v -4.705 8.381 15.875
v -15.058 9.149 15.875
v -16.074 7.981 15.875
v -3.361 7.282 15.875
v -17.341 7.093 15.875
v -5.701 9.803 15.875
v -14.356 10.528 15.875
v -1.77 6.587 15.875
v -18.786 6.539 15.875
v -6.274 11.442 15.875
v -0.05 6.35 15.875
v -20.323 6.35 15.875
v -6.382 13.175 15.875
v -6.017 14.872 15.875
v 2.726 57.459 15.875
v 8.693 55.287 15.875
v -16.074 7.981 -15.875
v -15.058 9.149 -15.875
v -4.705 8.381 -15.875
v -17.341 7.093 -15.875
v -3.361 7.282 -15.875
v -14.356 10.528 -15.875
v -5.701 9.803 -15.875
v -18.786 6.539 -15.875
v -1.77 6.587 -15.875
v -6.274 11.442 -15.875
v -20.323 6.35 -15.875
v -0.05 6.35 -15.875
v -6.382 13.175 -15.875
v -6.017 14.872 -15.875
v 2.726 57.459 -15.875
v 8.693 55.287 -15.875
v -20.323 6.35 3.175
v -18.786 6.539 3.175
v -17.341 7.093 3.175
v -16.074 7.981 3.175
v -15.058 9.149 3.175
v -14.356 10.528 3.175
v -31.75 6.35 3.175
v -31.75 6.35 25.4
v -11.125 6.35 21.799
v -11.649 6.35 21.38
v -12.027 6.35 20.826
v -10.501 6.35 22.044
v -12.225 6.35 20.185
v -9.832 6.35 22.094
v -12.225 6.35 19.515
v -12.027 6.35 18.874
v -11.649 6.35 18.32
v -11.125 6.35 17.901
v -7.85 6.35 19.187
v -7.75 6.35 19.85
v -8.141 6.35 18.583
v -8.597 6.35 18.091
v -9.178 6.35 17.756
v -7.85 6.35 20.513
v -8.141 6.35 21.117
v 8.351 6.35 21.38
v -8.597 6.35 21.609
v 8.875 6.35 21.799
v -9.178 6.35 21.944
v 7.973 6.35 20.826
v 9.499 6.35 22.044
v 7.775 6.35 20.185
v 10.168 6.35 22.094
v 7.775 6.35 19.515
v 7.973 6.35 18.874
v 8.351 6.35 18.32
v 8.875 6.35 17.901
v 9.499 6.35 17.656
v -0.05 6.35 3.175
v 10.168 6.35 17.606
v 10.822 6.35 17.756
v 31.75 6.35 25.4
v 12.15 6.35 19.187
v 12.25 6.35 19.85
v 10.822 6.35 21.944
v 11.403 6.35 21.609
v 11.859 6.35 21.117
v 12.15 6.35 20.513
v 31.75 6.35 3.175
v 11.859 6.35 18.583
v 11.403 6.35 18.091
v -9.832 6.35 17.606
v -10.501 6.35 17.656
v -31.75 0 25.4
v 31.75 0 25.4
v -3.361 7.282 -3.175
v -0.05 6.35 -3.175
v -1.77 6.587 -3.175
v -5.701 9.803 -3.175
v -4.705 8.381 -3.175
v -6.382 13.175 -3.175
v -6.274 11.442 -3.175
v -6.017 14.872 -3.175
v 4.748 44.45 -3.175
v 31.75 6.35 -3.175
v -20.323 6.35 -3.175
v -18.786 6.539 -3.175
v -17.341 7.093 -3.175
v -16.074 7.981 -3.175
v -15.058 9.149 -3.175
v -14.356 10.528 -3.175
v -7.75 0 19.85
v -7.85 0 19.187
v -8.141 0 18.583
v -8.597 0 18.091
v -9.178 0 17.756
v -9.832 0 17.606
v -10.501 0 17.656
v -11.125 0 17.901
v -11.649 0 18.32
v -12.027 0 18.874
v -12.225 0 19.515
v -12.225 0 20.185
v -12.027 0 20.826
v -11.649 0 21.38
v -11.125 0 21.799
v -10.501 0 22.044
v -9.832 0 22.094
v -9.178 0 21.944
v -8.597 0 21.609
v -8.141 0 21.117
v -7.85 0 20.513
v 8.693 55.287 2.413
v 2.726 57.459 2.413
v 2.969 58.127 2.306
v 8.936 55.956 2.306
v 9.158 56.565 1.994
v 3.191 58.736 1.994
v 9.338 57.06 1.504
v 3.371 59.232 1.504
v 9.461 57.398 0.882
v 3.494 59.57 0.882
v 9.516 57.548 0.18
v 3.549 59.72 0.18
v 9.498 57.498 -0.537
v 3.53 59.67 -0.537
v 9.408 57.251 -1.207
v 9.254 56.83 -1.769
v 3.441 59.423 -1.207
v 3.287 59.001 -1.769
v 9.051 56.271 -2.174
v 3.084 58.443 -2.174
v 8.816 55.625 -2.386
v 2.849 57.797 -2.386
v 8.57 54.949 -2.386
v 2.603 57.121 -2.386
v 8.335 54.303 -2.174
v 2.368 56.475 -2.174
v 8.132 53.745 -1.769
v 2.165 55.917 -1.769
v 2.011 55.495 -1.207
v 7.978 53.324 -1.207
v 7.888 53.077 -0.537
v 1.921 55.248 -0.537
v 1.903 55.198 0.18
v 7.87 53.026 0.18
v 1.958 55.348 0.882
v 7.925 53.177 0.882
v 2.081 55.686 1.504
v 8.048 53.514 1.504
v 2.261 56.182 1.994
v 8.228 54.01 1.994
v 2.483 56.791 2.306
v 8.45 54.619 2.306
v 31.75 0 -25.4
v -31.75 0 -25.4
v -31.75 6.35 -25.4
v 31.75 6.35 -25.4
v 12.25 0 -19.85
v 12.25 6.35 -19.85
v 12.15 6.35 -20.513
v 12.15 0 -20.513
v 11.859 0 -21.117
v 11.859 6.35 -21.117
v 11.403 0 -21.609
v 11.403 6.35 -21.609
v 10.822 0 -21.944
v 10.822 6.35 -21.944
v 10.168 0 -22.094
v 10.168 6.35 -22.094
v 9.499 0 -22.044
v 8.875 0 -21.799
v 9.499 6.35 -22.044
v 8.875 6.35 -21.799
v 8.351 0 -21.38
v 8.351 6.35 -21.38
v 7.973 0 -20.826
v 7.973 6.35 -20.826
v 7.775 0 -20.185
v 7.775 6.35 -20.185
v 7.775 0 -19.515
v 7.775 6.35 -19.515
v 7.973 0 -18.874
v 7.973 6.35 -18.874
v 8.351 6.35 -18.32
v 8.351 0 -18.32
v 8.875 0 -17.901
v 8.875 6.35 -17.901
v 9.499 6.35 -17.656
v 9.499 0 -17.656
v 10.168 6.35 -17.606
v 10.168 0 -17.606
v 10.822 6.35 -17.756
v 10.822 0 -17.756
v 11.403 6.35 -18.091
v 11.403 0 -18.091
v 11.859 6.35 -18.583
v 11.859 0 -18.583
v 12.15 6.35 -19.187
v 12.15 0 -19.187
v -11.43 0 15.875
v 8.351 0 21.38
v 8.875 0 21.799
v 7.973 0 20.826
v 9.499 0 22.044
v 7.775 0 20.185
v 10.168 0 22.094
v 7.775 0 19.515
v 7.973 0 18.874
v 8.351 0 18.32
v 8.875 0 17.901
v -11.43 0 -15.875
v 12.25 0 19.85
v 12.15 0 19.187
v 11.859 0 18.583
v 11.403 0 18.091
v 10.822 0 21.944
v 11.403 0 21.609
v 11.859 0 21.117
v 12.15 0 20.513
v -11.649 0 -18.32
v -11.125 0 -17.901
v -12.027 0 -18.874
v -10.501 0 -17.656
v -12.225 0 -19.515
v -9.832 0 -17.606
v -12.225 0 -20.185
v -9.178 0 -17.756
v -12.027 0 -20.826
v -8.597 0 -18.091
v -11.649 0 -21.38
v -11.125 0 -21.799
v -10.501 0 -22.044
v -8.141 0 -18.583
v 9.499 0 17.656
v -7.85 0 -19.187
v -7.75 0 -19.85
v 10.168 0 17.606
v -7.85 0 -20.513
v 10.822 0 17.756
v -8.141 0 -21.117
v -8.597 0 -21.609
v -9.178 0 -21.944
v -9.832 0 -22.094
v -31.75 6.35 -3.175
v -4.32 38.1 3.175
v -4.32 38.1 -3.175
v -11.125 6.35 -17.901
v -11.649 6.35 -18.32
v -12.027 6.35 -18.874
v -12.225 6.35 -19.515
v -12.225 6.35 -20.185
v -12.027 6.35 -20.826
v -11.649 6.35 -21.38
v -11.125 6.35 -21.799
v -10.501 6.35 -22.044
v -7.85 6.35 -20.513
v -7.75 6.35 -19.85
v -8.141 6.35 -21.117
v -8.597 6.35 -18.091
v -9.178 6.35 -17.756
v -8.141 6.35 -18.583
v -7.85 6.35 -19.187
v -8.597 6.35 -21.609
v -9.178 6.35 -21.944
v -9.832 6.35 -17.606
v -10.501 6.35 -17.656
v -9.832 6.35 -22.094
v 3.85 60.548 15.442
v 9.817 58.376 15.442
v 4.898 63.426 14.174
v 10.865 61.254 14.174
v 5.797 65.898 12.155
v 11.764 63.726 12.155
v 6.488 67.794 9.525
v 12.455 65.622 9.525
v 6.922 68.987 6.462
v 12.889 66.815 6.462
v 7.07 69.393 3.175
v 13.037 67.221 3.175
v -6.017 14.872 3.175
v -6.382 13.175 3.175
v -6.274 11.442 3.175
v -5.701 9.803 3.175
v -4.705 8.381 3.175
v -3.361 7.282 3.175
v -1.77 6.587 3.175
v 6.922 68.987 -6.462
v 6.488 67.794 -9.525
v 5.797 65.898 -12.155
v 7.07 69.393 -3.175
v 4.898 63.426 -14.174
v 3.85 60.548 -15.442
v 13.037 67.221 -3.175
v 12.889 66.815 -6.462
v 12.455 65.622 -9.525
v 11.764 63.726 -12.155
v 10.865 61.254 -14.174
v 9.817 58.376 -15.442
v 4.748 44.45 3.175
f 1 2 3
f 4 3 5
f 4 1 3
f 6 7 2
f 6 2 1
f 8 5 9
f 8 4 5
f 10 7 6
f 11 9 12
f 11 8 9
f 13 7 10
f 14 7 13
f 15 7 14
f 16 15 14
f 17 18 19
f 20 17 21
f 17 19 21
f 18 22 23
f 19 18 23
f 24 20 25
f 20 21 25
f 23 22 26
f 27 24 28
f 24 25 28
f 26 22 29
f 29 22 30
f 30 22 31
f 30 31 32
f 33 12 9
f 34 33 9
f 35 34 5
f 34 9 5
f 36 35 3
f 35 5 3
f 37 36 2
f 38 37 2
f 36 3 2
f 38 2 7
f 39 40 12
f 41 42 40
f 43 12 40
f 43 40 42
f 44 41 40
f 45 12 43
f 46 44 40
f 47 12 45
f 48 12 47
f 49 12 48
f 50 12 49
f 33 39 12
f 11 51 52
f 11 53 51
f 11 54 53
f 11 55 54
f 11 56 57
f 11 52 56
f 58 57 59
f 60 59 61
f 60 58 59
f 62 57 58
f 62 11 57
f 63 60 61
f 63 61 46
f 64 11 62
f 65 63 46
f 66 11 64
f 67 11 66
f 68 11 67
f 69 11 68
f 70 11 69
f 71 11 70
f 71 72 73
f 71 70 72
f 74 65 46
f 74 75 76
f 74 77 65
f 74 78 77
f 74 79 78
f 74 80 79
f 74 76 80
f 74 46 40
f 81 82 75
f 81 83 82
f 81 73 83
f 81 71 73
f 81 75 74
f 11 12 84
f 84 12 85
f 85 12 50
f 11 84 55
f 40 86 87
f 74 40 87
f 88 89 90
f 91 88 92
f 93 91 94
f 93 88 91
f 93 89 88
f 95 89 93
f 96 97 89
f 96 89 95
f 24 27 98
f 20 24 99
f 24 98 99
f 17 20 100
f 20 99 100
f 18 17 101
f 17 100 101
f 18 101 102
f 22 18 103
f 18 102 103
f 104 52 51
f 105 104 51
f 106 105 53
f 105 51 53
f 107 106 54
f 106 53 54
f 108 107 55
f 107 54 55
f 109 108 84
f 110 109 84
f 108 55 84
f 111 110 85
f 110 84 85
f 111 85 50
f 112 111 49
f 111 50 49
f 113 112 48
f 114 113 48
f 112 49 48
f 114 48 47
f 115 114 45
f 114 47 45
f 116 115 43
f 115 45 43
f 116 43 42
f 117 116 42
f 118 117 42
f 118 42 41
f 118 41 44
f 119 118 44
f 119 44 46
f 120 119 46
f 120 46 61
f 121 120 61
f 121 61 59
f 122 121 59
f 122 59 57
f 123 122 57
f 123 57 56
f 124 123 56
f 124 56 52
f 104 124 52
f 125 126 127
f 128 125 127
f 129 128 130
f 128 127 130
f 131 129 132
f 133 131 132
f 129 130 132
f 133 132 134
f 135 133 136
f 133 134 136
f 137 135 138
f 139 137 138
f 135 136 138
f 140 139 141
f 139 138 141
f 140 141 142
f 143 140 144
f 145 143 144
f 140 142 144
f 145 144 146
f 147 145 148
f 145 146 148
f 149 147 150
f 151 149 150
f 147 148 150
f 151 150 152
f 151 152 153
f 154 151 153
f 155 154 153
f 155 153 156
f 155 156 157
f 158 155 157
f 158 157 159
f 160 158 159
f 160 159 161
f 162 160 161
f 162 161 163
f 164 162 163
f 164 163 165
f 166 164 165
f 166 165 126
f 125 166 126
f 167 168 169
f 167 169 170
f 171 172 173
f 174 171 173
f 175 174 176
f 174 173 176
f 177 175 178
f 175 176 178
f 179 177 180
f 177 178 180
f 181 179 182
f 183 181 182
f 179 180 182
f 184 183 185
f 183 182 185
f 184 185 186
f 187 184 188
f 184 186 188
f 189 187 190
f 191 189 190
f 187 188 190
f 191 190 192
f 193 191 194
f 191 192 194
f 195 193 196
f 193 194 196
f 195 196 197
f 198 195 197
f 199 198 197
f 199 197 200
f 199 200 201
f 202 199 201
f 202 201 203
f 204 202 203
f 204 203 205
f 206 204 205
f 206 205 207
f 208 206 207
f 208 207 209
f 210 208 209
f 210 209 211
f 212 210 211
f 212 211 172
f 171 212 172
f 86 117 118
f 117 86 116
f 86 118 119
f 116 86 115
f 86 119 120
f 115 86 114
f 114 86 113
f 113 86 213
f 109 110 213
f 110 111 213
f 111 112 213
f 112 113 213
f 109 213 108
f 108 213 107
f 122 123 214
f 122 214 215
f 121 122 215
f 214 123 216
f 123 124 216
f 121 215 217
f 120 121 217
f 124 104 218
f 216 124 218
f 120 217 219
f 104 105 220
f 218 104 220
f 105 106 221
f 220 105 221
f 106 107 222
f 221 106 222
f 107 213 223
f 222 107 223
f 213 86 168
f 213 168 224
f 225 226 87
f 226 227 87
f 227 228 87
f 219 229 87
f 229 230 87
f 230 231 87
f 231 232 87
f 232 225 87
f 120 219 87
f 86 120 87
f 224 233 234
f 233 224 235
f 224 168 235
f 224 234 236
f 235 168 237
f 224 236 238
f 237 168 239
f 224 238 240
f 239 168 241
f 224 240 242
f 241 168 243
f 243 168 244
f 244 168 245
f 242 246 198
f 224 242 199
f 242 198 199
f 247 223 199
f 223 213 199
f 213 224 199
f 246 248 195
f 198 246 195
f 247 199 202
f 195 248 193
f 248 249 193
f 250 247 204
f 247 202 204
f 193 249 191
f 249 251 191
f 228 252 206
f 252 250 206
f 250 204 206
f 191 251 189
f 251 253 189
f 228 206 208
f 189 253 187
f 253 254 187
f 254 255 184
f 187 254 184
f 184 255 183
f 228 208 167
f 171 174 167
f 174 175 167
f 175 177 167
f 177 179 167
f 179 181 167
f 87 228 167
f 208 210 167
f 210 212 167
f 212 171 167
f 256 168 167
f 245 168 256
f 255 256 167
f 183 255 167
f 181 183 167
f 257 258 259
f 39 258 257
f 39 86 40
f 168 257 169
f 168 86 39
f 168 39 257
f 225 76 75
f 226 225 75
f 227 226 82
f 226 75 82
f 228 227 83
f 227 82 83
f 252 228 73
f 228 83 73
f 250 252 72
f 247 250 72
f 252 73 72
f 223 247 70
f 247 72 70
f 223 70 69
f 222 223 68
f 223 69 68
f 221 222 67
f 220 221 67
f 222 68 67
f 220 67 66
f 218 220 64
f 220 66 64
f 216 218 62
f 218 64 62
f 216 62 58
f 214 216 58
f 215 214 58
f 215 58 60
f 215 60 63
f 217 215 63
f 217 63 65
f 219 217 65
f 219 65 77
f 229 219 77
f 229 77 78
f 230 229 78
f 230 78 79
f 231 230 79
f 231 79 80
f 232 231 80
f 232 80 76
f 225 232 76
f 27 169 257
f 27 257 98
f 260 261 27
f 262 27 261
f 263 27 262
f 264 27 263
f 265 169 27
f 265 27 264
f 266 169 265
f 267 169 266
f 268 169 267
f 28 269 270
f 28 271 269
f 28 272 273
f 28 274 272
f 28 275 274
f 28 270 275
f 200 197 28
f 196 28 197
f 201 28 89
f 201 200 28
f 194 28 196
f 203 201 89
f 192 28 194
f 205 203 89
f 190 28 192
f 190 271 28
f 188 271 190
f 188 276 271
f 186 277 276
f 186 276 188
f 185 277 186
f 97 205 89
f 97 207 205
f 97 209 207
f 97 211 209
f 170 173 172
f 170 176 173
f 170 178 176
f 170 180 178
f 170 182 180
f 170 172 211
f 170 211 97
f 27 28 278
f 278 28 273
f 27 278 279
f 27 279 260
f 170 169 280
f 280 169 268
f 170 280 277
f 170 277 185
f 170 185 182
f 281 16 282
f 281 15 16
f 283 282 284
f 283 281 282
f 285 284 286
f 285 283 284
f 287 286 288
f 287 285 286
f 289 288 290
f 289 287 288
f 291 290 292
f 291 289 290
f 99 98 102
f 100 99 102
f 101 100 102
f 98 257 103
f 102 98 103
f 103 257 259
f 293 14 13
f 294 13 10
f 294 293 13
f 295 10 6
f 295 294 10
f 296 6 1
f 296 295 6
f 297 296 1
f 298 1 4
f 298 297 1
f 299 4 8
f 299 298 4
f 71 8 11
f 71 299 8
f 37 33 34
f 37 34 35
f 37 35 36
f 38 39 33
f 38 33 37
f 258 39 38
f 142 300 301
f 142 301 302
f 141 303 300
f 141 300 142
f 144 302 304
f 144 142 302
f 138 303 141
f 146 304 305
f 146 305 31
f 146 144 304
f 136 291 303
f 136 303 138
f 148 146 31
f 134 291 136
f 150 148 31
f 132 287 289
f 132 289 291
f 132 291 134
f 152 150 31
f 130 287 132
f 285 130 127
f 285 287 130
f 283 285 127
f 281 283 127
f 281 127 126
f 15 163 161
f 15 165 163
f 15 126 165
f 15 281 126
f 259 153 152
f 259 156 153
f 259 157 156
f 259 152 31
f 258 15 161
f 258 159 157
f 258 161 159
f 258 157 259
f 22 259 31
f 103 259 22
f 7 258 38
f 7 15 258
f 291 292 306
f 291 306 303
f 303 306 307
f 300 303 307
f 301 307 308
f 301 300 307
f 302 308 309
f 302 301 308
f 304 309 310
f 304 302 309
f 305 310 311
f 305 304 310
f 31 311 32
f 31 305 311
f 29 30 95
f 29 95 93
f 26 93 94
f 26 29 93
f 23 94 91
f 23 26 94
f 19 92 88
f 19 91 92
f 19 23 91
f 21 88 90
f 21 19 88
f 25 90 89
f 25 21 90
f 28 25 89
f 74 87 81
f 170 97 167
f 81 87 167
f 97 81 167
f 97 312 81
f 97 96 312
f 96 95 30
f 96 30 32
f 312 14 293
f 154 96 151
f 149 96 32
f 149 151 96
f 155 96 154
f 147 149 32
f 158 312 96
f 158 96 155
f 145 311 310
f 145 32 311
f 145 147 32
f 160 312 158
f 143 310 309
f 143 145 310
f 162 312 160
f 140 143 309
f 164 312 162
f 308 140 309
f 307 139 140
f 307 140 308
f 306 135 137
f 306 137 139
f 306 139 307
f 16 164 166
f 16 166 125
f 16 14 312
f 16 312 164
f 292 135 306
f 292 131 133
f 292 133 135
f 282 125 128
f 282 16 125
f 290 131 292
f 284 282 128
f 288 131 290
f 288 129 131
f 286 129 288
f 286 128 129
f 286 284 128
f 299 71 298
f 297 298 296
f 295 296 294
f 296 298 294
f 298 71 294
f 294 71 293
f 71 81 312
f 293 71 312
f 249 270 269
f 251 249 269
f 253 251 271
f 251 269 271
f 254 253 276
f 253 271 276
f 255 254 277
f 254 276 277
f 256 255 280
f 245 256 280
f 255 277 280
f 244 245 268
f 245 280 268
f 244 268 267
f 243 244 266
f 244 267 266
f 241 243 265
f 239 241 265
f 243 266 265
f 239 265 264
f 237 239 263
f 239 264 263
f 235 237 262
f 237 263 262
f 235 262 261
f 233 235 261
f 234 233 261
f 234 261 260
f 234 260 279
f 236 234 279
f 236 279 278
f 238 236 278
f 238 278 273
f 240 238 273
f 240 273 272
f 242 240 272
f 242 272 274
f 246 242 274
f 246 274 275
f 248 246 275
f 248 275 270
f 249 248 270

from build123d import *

# Parameters (mm, degrees)
SKETCH1_W           = 63.5
SKETCH1_H           = 50.8
BOSS_EXTRUDE1_DEPTH = 6.35
BOSS_EXTRUDE2_DEPTH = 15.875
FILLET1_R           = 12.7
FILLET2_R           = 6.35
BOSS_EXTRUDE5_DEPTH = 3.175
SKETCH5_R           = 2.413
CUT_EXTRUDE3_DEPTH  = 47.925927366
SKETCH8_R           = 2.25
CUT_EXTRUDE4_DEPTH  = 7.35


with BuildPart() as part:
    # Sketch1 → Boss-Extrude1 (new body)
    with BuildSketch(Plane(origin=(0, 0, 0), x_dir=(1, 0, 0), z_dir=(0, 1, 0))):
        Rectangle(SKETCH1_W, SKETCH1_H)
    extrude(amount=BOSS_EXTRUDE1_DEPTH)

    # Sketch2 → Boss-Extrude2 (add, symmetric)
    with BuildSketch(Plane.XY):
        Polygon((-11.43, 0), (13.036574415, 67.221360736), (7.069526273, 69.393188646), (-17.397048142, 2.17182791), align=None)
    extrude(amount=BOSS_EXTRUDE2_DEPTH, both=True)

    # Fillet1
    fillet1_edges = [part.edges().sort_by_distance(p)[0] for p in [
        (10.053050344, 68.307274691, 15.875),
        (10.053050344, 68.307274691, -15.875),
    ]]
    fillet(fillet1_edges, radius=FILLET1_R)

    # Fillet2
    fillet2_edges = [part.edges().sort_by_distance(p)[0] for p in [
        (-15.876317868, 6.35, 0),
        (-9.118789012, 6.35, 0),
    ]]
    fillet(fillet2_edges, radius=FILLET2_R)

    # Sketch7 → Boss-Extrude5 (add, symmetric)
    with BuildSketch(Plane.XY):
        with BuildLine():
            Line((4.748476913, 44.45), (31.75, 6.35))
            Line((31.75, 6.35), (-0.05004917, 6.35))
            ThreePointArc((-0.05004917, 6.35), (-5.251664651, 9.057789629), (-6.017097312, 14.87182791))
            Line((-6.017097312, 14.87182791), (4.748476913, 44.45))
        make_face()
        with BuildLine():
            Line((-31.75, 6.35), (-20.322635735, 6.35))
            ThreePointArc((-20.322635735, 6.35), (-16.680425364, 7.498384519), (-14.355587593, 10.52817209))
            Line((-14.355587593, 10.52817209), (-4.32026293, 38.1))
            Line((-4.32026293, 38.1), (-31.75, 6.35))
        make_face()
    extrude(amount=BOSS_EXTRUDE5_DEPTH, both=True)

    # Sketch5 → Cut-Extrude3 (cut, through all)
    with BuildSketch(Plane(origin=(-16.059992134, 5.845359099, 0), x_dir=(0, 0, 1), z_dir=(-0.939692621, 0.342020143, 0))):
        with Locations((0, 54.926187693)):
            Circle(SKETCH5_R)
    extrude(amount=-CUT_EXTRUDE3_DEPTH, mode=Mode.SUBTRACT)

    # Sketch8 → Cut-Extrude4 (cut, through all)
    with BuildSketch(Plane(origin=(0, 6.35, 0), x_dir=(1, 0, 0), z_dir=(0, 1, 0))):
        with Locations((10, -19.85)):
            Circle(SKETCH8_R)
        with Locations((10, 19.85)):
            Circle(SKETCH8_R)
        with Locations((-10, 19.85)):
            Circle(SKETCH8_R)
        with Locations((-10, -19.85)):
            Circle(SKETCH8_R)
    extrude(amount=-CUT_EXTRUDE4_DEPTH, mode=Mode.SUBTRACT)


solid = part.part
